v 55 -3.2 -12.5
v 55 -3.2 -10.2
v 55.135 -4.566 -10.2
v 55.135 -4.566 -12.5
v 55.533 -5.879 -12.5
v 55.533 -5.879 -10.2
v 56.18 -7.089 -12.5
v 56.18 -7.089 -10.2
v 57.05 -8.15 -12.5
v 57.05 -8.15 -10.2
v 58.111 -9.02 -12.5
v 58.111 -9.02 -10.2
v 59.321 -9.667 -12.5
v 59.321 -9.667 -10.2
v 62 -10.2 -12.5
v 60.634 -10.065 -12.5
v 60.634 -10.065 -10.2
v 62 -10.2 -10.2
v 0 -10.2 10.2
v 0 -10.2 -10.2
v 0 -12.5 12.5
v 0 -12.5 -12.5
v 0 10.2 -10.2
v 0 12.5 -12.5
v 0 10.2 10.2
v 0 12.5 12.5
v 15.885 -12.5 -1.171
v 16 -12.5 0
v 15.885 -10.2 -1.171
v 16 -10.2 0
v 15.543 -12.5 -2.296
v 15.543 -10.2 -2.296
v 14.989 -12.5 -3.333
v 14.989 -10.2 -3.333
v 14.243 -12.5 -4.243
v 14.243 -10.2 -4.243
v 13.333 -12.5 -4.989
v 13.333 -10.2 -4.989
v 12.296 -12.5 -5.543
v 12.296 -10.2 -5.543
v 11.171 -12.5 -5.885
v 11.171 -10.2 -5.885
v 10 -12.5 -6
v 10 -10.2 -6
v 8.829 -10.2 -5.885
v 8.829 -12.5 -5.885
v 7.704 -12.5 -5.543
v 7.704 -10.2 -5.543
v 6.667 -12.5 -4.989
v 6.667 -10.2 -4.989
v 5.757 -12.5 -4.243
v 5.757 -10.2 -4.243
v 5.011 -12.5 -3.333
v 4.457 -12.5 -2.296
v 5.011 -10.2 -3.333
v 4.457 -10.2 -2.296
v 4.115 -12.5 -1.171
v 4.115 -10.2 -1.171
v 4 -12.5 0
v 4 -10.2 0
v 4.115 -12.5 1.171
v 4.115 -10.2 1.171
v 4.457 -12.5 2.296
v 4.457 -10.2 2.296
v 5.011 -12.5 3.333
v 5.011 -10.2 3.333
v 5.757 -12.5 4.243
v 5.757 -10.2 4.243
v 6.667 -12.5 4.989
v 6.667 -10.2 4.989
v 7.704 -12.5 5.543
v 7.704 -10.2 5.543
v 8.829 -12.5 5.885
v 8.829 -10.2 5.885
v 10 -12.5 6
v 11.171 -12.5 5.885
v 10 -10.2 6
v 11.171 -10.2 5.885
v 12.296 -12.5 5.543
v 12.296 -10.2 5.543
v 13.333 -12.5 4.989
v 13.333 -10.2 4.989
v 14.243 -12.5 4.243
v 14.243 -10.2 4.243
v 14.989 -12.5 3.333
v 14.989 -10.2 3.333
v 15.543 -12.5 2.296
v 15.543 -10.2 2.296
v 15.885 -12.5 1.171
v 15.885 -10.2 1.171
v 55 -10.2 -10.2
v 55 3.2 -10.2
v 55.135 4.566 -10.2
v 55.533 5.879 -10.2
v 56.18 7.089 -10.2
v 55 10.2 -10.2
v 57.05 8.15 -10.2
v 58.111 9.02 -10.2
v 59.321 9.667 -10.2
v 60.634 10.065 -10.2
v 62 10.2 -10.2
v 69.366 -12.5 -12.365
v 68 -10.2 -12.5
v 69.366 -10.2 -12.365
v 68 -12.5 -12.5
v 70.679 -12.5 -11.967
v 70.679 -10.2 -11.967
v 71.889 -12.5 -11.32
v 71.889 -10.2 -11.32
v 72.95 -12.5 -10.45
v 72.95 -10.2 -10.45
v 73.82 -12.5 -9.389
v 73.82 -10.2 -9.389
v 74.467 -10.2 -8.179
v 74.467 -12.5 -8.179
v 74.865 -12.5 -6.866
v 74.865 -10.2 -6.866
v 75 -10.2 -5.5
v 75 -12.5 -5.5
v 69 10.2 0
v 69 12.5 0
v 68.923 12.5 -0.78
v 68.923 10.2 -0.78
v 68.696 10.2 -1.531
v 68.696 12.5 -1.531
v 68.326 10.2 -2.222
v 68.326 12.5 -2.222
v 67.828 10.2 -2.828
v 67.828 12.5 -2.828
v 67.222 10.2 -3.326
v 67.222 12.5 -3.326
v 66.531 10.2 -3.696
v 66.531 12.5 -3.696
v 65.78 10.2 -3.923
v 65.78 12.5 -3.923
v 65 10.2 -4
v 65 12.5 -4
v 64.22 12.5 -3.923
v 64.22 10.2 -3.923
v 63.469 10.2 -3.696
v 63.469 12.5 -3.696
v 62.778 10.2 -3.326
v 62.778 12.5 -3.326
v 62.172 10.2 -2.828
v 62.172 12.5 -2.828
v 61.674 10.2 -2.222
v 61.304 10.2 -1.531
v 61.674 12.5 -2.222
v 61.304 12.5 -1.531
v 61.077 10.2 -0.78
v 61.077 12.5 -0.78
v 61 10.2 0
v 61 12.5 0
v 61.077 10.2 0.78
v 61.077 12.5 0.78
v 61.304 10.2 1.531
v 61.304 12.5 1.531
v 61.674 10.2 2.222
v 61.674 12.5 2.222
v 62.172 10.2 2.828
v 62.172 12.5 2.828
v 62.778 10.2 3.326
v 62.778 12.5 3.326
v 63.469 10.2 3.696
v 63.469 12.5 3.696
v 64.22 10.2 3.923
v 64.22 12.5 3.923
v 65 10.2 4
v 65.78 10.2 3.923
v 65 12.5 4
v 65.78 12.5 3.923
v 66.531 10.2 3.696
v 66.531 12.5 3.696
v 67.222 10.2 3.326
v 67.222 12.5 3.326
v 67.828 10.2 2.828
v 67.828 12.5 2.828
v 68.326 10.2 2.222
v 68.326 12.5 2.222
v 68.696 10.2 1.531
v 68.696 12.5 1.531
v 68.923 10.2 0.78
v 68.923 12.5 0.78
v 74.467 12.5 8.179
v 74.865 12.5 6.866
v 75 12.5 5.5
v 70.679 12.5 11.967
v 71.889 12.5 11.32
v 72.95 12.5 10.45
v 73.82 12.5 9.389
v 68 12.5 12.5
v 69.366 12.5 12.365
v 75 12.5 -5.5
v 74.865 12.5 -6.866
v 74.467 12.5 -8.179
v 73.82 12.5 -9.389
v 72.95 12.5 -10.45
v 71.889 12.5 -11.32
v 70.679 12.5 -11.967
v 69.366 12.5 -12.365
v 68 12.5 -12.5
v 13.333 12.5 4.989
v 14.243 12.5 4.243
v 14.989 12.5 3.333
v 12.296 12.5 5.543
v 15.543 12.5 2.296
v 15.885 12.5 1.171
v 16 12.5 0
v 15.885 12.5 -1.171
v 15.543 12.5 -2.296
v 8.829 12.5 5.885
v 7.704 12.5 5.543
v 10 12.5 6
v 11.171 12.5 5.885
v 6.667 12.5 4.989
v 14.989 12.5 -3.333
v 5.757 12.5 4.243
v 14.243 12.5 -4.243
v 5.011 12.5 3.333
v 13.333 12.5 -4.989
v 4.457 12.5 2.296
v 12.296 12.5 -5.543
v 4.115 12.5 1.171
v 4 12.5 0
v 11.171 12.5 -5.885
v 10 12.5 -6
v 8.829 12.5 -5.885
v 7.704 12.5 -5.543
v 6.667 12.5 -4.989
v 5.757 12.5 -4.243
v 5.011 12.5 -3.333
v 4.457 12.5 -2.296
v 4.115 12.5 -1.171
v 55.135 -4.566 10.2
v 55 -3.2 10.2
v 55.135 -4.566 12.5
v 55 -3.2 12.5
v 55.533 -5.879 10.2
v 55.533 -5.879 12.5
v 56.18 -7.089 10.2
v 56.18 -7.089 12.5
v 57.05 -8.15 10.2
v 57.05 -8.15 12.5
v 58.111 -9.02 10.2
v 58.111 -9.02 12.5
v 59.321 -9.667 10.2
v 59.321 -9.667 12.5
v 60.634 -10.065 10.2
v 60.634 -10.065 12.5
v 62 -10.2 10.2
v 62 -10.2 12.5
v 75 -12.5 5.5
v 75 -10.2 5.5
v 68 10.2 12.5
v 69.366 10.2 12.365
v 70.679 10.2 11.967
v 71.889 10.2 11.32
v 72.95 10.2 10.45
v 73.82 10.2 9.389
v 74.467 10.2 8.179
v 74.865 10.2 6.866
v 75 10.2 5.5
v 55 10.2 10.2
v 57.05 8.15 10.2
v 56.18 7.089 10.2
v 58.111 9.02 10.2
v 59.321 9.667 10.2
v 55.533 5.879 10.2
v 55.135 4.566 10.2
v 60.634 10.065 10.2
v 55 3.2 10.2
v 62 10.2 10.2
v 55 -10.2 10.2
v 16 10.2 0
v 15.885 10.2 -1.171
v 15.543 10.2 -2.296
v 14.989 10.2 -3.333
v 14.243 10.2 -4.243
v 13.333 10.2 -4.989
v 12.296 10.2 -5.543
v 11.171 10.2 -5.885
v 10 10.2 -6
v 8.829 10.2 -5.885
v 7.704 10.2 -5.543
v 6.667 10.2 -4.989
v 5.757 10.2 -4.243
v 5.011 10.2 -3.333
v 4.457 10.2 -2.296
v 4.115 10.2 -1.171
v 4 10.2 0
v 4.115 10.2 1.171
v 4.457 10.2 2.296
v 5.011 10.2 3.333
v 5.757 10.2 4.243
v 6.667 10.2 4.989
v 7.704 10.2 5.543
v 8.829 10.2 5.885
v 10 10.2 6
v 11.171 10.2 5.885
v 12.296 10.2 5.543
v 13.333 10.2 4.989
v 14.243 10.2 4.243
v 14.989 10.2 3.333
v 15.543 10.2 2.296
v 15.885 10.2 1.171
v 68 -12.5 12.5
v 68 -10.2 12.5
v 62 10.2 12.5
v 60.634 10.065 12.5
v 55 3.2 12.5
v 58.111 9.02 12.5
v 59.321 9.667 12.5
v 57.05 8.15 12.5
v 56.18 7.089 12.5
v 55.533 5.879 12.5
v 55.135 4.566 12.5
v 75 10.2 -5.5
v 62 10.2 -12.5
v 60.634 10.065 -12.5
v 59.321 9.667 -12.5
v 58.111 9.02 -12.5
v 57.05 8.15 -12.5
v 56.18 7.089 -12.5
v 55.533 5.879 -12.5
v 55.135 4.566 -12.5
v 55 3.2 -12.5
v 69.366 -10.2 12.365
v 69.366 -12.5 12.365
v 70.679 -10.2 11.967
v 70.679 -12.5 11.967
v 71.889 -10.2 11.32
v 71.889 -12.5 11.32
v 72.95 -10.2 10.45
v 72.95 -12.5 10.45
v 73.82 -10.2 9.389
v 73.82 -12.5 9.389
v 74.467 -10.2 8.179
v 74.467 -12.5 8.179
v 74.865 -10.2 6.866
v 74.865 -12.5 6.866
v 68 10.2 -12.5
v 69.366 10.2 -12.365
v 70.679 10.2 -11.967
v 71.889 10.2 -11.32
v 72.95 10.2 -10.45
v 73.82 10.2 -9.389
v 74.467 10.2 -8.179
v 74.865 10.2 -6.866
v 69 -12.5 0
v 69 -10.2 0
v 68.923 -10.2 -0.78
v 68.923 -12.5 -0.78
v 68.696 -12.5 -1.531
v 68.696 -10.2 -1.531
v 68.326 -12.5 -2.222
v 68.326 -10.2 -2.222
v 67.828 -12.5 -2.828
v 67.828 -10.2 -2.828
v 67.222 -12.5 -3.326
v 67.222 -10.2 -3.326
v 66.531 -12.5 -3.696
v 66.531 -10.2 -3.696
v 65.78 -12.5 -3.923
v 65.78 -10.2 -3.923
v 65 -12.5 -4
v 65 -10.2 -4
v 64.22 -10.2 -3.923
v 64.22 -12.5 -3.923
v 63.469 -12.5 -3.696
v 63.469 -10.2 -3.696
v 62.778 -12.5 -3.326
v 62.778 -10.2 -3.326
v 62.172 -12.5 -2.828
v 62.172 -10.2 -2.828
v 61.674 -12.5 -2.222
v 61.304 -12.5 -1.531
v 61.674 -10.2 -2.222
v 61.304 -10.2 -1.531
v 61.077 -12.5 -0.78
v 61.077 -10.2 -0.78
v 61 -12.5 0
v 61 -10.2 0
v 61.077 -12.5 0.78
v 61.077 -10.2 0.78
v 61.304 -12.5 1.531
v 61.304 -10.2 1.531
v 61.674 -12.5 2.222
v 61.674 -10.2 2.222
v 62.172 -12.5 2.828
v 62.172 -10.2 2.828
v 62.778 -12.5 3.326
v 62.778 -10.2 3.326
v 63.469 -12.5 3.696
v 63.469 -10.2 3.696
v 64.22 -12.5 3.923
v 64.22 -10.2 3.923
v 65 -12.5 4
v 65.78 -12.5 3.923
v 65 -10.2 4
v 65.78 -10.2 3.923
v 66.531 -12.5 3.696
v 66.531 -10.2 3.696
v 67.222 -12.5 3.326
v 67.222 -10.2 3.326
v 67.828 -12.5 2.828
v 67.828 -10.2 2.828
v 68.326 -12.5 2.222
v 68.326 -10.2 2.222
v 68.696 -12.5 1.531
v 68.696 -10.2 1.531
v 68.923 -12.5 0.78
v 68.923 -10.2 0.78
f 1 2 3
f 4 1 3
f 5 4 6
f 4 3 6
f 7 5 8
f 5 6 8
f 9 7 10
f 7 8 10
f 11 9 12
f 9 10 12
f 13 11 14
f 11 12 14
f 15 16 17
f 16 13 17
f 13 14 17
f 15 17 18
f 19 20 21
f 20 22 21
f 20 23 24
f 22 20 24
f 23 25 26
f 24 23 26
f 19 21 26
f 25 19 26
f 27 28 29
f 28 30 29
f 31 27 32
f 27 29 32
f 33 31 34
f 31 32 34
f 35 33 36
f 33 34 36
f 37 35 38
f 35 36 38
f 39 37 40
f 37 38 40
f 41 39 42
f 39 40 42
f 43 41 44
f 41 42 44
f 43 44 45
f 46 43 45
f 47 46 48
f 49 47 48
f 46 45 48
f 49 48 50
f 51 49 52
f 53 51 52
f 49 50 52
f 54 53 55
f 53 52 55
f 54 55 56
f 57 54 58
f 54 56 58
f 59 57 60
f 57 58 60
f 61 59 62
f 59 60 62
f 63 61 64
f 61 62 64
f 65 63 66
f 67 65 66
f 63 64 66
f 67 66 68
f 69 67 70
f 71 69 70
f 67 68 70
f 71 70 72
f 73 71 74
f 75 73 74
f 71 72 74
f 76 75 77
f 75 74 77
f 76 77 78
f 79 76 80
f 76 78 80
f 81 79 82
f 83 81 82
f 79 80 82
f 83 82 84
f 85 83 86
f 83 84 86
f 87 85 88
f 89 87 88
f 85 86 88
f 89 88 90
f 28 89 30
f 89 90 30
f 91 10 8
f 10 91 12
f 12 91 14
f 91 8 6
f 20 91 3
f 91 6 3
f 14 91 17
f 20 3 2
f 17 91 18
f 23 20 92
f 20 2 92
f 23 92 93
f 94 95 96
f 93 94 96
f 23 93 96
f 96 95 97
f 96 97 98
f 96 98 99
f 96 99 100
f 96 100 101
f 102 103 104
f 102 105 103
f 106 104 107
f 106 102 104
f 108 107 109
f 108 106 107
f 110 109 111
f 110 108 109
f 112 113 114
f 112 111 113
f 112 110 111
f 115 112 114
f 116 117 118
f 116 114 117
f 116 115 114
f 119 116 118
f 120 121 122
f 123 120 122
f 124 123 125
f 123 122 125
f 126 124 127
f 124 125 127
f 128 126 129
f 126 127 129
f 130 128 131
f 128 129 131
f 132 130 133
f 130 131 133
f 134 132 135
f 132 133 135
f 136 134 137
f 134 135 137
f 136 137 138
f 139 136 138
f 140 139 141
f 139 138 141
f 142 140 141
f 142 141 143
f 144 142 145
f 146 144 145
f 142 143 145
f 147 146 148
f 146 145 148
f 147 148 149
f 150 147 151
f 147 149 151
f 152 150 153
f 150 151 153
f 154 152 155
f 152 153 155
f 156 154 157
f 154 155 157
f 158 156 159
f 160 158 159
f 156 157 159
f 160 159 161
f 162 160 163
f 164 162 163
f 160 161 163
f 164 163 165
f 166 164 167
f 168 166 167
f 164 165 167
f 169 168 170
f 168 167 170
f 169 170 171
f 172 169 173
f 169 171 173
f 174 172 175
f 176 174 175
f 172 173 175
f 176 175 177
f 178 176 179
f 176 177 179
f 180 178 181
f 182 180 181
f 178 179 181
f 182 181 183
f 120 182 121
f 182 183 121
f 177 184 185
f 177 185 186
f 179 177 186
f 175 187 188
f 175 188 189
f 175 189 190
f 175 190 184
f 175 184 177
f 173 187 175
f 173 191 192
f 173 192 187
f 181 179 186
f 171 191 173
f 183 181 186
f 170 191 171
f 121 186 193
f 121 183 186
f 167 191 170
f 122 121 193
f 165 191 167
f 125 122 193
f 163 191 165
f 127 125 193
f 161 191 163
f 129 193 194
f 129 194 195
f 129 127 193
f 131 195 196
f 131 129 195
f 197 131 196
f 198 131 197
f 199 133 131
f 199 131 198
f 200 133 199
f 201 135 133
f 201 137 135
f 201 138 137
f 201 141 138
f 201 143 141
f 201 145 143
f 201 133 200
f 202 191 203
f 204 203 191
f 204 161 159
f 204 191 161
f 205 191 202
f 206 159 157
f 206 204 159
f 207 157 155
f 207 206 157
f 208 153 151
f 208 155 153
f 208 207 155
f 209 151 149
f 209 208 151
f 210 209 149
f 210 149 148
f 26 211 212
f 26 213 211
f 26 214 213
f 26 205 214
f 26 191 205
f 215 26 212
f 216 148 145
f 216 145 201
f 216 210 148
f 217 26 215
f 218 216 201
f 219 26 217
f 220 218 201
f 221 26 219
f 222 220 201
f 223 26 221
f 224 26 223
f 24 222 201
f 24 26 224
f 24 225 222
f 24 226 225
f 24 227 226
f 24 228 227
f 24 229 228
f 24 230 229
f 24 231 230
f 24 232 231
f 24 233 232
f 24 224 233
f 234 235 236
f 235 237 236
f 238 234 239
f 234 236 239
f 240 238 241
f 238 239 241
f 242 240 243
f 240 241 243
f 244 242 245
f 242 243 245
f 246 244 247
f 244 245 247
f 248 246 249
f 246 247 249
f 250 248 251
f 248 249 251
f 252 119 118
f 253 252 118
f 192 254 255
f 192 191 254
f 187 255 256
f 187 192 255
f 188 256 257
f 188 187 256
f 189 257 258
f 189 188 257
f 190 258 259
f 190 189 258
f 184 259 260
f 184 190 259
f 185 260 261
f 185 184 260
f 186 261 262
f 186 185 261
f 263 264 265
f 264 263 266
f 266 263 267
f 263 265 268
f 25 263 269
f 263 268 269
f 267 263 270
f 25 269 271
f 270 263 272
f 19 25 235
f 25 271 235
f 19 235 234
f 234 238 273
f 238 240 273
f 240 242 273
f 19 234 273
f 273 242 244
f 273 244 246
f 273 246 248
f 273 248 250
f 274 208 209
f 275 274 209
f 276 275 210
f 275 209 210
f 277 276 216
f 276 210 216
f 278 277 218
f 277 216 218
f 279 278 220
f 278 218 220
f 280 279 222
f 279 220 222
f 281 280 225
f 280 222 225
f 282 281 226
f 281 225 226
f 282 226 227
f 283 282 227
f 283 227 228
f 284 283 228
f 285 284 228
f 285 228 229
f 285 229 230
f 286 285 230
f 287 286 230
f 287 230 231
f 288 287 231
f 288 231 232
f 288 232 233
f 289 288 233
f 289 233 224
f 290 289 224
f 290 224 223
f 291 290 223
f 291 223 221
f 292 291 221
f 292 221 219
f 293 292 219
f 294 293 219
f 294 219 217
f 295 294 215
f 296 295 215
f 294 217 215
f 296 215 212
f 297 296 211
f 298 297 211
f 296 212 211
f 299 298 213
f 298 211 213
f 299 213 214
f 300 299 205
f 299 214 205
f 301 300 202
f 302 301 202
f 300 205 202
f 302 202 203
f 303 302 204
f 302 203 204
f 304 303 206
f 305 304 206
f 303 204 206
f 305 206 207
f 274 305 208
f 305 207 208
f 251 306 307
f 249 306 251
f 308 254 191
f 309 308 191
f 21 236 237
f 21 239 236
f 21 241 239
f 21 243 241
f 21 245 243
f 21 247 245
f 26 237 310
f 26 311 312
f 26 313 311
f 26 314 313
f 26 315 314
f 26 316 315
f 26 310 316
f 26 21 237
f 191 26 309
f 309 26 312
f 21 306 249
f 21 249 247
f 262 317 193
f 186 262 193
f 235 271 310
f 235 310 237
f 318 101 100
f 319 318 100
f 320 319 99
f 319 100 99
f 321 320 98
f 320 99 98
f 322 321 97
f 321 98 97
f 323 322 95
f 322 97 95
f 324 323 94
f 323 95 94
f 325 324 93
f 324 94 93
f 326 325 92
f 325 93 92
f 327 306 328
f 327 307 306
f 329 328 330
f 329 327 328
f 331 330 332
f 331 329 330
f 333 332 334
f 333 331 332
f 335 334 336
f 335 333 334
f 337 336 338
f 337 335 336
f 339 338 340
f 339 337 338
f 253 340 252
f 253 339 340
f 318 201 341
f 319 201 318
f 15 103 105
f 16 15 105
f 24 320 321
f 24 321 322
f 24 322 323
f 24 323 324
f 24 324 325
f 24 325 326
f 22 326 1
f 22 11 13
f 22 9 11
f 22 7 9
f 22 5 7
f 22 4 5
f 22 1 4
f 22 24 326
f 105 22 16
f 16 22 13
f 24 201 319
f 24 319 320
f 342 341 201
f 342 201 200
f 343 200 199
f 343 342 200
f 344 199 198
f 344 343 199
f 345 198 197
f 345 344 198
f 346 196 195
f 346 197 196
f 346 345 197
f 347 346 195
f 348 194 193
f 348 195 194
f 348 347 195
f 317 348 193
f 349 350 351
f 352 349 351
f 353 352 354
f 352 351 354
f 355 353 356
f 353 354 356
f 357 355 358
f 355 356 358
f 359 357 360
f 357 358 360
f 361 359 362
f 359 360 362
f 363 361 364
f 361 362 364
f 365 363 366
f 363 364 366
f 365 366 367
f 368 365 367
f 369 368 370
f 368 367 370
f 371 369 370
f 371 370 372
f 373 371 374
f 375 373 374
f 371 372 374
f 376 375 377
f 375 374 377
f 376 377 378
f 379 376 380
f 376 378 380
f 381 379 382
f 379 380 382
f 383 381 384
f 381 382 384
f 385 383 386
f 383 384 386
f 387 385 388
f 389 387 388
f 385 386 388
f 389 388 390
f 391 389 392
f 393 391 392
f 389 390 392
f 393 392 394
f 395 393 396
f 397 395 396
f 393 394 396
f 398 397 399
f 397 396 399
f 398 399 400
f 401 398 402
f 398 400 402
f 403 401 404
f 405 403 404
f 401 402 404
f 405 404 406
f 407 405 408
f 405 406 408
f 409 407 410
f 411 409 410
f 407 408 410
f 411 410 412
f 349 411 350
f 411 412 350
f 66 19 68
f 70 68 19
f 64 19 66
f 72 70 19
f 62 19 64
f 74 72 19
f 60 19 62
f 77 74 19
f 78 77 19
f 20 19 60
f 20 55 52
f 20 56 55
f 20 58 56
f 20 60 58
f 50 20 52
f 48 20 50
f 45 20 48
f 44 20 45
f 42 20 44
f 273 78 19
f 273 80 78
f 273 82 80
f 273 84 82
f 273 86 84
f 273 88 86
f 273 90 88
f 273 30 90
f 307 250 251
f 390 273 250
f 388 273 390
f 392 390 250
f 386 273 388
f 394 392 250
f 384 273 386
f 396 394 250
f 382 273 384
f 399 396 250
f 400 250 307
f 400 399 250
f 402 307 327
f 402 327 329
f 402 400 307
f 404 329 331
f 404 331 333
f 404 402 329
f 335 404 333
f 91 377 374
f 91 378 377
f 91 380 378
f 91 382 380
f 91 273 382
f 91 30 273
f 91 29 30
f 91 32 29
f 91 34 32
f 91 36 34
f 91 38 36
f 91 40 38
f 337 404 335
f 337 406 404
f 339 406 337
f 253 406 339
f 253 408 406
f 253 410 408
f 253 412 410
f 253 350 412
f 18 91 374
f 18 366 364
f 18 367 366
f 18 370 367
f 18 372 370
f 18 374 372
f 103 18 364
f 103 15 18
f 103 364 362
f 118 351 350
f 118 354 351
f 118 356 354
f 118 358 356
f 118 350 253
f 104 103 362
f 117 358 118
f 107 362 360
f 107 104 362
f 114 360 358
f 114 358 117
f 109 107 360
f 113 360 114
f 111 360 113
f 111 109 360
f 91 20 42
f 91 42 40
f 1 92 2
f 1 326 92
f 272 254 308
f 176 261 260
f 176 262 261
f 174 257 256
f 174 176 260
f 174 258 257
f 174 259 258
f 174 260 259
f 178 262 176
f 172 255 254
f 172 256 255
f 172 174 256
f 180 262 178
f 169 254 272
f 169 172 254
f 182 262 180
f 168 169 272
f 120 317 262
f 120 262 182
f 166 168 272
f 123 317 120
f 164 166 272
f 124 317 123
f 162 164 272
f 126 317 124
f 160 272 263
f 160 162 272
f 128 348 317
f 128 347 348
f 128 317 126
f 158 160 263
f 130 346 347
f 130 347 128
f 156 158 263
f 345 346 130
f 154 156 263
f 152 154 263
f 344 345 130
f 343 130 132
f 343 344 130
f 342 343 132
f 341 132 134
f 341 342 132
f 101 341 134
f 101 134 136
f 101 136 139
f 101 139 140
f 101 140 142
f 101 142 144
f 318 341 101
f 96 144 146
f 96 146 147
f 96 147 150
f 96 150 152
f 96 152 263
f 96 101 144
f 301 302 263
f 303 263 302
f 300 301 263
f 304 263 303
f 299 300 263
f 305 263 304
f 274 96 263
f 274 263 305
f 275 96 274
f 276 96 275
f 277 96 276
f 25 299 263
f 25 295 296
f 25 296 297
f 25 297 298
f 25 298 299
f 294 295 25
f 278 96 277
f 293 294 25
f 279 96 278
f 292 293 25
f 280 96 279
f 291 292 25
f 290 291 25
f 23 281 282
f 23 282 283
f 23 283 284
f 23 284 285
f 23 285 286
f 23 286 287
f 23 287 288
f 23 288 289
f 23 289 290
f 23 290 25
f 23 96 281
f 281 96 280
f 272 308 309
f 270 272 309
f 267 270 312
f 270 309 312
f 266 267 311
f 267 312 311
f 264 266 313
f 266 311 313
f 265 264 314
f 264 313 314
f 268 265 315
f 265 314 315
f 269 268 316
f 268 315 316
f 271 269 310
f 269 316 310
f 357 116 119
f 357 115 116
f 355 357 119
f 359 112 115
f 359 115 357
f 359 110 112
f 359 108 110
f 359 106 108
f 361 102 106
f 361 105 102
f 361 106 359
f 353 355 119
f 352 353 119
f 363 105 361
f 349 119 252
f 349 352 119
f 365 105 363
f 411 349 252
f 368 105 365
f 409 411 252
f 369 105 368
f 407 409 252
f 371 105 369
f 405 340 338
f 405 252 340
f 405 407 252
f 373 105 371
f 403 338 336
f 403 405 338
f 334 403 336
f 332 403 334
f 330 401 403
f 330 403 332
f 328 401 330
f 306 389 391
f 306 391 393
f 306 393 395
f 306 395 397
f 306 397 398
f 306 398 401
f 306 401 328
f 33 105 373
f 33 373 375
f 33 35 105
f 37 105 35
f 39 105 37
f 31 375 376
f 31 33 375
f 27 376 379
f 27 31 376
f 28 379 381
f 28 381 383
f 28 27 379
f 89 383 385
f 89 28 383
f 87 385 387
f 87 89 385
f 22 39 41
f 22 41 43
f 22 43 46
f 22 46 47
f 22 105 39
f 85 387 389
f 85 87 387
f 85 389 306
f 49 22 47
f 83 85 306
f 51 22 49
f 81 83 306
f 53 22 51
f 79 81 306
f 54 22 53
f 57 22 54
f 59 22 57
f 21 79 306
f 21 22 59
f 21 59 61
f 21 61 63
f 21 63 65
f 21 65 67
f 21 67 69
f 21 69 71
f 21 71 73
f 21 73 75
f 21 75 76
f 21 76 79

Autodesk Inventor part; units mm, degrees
ref_plane "YZ Plane" through (0, 0, 0) normal (1, 0, 0) x (0, 1, 0)
ref_plane "XZ Plane" through (0, 0, 0) normal (0, 1, 0) x (-1, 0, 0)
ref_plane "XY Plane" through (0, 0, 0) normal (0, 0, 1) x (1, 0, 0)
sketch "スケッチ1" plane through (0, 0, 0) normal (1, 0, 0) x (0, 1, 0)
  line L0 (-12.5, 12.5) -> (12.5, 12.5)
  line L1 (12.5, 12.5) -> (12.5, -12.5)
  line L2 (12.5, -12.5) -> (-12.5, -12.5)
  line L3 (-12.5, -12.5) -> (-12.5, 12.5)
  line L4 (-12.5, 12.5) -> (12.5, -12.5) construction
  line L5 (12.5, 12.5) -> (-12.5, -12.5) construction
  point P0 (0, 0)
  dimension "d0" = 25
  dimension "d1" = 25
extrude "押し出し1" add sketch "スケッチ1" along normal blind 75
sketch "スケッチ2" plane through (0, 12.5, 12.5) normal (0, 1, 0) x (1, 0, 0)
  circle A0 centre (10, 12.5) radius 6
  line L0 (0, 0) -> (0, 25) projected
  line L1 (0, 0) -> (75, 0) projected
  point P0 (0, 12.5)
  dimension "d4" = 12
  dimension "d5" = 10
  dimension "d6" = 12.5
extrude "押し出し2" cut sketch "スケッチ2" against normal through all
sketch "スケッチ3" plane through (0, 12.5, 12.5) normal (0, 1, 0) x (1, 0, 0)
  circle A0 centre (65, 12.5) radius 4
  line L0 (75, 25) -> (75, 0) projected
  line L1 (0, 25) -> (75, 25) projected
  point P0 (0, 12.5)
  dimension "d9" = 10
  dimension "d10" = 8
  dimension "d11" = 12.5
extrude "押し出し3" cut sketch "スケッチ3" against normal through all
sketch "スケッチ4" plane through (75, 0, 0) normal (1, 0, 0) x (0, 0, -1)
  line L0 (-10.2, -10.2) -> (10.2, -10.2)
  line L1 (10.2, -10.2) -> (10.2, 10.2)
  line L2 (10.2, 10.2) -> (-10.2, 10.2)
  line L3 (-10.2, 10.2) -> (-10.2, -10.2)
  line L4 (-10.2, -10.2) -> (10.2, 10.2) construction
  line L5 (10.2, -10.2) -> (-10.2, 10.2) construction
  line L6 (-12.5, 12.5) -> (-12.5, -12.5) projected
  line L7 (12.5, 12.5) -> (-12.5, 12.5) projected
  point P0 (0, 0)
  dimension "d14" = 2.3
  dimension "d15" = 2.3
extrude "押し出し4" cut sketch "スケッチ4" against normal through all
sketch "スケッチ5" plane through (0, -12.5, -12.5) normal (0, 0, -1) x (-1, 0, 0)
  line L0 (-75, 2.3) -> (-75, 22.7) projected
  line L1 (-75, 22.7) -> (-55, 22.7)
  line L2 (-55, 22.7) -> (-55, 2.3)
  line L3 (-55, 2.3) -> (-75, 2.3)
  line L4 (-75, 2.3) -> (-75, 22.7)
  line L5 (-75, 2.3) -> (0, 2.3) projected
  point P0 (0, 12.5)
  dimension "d18" = 20
extrude "押し出し5" cut sketch "スケッチ5" against normal through all
fillet "フィレット1" radius 7 8 edges at (55, 10.2, 11.35) (55, 10.2, -11.35) (75, 11.35, -12.5) (75, 11.35, 12.5) (75, -11.35, -12.5) (75, -11.35, 12.5) (55, -10.2, 11.35) (55, -10.2, -11.35)
equation "\"d1\" = d0"
properties part number "bracket2" material "鉄、可鍛鉄"
